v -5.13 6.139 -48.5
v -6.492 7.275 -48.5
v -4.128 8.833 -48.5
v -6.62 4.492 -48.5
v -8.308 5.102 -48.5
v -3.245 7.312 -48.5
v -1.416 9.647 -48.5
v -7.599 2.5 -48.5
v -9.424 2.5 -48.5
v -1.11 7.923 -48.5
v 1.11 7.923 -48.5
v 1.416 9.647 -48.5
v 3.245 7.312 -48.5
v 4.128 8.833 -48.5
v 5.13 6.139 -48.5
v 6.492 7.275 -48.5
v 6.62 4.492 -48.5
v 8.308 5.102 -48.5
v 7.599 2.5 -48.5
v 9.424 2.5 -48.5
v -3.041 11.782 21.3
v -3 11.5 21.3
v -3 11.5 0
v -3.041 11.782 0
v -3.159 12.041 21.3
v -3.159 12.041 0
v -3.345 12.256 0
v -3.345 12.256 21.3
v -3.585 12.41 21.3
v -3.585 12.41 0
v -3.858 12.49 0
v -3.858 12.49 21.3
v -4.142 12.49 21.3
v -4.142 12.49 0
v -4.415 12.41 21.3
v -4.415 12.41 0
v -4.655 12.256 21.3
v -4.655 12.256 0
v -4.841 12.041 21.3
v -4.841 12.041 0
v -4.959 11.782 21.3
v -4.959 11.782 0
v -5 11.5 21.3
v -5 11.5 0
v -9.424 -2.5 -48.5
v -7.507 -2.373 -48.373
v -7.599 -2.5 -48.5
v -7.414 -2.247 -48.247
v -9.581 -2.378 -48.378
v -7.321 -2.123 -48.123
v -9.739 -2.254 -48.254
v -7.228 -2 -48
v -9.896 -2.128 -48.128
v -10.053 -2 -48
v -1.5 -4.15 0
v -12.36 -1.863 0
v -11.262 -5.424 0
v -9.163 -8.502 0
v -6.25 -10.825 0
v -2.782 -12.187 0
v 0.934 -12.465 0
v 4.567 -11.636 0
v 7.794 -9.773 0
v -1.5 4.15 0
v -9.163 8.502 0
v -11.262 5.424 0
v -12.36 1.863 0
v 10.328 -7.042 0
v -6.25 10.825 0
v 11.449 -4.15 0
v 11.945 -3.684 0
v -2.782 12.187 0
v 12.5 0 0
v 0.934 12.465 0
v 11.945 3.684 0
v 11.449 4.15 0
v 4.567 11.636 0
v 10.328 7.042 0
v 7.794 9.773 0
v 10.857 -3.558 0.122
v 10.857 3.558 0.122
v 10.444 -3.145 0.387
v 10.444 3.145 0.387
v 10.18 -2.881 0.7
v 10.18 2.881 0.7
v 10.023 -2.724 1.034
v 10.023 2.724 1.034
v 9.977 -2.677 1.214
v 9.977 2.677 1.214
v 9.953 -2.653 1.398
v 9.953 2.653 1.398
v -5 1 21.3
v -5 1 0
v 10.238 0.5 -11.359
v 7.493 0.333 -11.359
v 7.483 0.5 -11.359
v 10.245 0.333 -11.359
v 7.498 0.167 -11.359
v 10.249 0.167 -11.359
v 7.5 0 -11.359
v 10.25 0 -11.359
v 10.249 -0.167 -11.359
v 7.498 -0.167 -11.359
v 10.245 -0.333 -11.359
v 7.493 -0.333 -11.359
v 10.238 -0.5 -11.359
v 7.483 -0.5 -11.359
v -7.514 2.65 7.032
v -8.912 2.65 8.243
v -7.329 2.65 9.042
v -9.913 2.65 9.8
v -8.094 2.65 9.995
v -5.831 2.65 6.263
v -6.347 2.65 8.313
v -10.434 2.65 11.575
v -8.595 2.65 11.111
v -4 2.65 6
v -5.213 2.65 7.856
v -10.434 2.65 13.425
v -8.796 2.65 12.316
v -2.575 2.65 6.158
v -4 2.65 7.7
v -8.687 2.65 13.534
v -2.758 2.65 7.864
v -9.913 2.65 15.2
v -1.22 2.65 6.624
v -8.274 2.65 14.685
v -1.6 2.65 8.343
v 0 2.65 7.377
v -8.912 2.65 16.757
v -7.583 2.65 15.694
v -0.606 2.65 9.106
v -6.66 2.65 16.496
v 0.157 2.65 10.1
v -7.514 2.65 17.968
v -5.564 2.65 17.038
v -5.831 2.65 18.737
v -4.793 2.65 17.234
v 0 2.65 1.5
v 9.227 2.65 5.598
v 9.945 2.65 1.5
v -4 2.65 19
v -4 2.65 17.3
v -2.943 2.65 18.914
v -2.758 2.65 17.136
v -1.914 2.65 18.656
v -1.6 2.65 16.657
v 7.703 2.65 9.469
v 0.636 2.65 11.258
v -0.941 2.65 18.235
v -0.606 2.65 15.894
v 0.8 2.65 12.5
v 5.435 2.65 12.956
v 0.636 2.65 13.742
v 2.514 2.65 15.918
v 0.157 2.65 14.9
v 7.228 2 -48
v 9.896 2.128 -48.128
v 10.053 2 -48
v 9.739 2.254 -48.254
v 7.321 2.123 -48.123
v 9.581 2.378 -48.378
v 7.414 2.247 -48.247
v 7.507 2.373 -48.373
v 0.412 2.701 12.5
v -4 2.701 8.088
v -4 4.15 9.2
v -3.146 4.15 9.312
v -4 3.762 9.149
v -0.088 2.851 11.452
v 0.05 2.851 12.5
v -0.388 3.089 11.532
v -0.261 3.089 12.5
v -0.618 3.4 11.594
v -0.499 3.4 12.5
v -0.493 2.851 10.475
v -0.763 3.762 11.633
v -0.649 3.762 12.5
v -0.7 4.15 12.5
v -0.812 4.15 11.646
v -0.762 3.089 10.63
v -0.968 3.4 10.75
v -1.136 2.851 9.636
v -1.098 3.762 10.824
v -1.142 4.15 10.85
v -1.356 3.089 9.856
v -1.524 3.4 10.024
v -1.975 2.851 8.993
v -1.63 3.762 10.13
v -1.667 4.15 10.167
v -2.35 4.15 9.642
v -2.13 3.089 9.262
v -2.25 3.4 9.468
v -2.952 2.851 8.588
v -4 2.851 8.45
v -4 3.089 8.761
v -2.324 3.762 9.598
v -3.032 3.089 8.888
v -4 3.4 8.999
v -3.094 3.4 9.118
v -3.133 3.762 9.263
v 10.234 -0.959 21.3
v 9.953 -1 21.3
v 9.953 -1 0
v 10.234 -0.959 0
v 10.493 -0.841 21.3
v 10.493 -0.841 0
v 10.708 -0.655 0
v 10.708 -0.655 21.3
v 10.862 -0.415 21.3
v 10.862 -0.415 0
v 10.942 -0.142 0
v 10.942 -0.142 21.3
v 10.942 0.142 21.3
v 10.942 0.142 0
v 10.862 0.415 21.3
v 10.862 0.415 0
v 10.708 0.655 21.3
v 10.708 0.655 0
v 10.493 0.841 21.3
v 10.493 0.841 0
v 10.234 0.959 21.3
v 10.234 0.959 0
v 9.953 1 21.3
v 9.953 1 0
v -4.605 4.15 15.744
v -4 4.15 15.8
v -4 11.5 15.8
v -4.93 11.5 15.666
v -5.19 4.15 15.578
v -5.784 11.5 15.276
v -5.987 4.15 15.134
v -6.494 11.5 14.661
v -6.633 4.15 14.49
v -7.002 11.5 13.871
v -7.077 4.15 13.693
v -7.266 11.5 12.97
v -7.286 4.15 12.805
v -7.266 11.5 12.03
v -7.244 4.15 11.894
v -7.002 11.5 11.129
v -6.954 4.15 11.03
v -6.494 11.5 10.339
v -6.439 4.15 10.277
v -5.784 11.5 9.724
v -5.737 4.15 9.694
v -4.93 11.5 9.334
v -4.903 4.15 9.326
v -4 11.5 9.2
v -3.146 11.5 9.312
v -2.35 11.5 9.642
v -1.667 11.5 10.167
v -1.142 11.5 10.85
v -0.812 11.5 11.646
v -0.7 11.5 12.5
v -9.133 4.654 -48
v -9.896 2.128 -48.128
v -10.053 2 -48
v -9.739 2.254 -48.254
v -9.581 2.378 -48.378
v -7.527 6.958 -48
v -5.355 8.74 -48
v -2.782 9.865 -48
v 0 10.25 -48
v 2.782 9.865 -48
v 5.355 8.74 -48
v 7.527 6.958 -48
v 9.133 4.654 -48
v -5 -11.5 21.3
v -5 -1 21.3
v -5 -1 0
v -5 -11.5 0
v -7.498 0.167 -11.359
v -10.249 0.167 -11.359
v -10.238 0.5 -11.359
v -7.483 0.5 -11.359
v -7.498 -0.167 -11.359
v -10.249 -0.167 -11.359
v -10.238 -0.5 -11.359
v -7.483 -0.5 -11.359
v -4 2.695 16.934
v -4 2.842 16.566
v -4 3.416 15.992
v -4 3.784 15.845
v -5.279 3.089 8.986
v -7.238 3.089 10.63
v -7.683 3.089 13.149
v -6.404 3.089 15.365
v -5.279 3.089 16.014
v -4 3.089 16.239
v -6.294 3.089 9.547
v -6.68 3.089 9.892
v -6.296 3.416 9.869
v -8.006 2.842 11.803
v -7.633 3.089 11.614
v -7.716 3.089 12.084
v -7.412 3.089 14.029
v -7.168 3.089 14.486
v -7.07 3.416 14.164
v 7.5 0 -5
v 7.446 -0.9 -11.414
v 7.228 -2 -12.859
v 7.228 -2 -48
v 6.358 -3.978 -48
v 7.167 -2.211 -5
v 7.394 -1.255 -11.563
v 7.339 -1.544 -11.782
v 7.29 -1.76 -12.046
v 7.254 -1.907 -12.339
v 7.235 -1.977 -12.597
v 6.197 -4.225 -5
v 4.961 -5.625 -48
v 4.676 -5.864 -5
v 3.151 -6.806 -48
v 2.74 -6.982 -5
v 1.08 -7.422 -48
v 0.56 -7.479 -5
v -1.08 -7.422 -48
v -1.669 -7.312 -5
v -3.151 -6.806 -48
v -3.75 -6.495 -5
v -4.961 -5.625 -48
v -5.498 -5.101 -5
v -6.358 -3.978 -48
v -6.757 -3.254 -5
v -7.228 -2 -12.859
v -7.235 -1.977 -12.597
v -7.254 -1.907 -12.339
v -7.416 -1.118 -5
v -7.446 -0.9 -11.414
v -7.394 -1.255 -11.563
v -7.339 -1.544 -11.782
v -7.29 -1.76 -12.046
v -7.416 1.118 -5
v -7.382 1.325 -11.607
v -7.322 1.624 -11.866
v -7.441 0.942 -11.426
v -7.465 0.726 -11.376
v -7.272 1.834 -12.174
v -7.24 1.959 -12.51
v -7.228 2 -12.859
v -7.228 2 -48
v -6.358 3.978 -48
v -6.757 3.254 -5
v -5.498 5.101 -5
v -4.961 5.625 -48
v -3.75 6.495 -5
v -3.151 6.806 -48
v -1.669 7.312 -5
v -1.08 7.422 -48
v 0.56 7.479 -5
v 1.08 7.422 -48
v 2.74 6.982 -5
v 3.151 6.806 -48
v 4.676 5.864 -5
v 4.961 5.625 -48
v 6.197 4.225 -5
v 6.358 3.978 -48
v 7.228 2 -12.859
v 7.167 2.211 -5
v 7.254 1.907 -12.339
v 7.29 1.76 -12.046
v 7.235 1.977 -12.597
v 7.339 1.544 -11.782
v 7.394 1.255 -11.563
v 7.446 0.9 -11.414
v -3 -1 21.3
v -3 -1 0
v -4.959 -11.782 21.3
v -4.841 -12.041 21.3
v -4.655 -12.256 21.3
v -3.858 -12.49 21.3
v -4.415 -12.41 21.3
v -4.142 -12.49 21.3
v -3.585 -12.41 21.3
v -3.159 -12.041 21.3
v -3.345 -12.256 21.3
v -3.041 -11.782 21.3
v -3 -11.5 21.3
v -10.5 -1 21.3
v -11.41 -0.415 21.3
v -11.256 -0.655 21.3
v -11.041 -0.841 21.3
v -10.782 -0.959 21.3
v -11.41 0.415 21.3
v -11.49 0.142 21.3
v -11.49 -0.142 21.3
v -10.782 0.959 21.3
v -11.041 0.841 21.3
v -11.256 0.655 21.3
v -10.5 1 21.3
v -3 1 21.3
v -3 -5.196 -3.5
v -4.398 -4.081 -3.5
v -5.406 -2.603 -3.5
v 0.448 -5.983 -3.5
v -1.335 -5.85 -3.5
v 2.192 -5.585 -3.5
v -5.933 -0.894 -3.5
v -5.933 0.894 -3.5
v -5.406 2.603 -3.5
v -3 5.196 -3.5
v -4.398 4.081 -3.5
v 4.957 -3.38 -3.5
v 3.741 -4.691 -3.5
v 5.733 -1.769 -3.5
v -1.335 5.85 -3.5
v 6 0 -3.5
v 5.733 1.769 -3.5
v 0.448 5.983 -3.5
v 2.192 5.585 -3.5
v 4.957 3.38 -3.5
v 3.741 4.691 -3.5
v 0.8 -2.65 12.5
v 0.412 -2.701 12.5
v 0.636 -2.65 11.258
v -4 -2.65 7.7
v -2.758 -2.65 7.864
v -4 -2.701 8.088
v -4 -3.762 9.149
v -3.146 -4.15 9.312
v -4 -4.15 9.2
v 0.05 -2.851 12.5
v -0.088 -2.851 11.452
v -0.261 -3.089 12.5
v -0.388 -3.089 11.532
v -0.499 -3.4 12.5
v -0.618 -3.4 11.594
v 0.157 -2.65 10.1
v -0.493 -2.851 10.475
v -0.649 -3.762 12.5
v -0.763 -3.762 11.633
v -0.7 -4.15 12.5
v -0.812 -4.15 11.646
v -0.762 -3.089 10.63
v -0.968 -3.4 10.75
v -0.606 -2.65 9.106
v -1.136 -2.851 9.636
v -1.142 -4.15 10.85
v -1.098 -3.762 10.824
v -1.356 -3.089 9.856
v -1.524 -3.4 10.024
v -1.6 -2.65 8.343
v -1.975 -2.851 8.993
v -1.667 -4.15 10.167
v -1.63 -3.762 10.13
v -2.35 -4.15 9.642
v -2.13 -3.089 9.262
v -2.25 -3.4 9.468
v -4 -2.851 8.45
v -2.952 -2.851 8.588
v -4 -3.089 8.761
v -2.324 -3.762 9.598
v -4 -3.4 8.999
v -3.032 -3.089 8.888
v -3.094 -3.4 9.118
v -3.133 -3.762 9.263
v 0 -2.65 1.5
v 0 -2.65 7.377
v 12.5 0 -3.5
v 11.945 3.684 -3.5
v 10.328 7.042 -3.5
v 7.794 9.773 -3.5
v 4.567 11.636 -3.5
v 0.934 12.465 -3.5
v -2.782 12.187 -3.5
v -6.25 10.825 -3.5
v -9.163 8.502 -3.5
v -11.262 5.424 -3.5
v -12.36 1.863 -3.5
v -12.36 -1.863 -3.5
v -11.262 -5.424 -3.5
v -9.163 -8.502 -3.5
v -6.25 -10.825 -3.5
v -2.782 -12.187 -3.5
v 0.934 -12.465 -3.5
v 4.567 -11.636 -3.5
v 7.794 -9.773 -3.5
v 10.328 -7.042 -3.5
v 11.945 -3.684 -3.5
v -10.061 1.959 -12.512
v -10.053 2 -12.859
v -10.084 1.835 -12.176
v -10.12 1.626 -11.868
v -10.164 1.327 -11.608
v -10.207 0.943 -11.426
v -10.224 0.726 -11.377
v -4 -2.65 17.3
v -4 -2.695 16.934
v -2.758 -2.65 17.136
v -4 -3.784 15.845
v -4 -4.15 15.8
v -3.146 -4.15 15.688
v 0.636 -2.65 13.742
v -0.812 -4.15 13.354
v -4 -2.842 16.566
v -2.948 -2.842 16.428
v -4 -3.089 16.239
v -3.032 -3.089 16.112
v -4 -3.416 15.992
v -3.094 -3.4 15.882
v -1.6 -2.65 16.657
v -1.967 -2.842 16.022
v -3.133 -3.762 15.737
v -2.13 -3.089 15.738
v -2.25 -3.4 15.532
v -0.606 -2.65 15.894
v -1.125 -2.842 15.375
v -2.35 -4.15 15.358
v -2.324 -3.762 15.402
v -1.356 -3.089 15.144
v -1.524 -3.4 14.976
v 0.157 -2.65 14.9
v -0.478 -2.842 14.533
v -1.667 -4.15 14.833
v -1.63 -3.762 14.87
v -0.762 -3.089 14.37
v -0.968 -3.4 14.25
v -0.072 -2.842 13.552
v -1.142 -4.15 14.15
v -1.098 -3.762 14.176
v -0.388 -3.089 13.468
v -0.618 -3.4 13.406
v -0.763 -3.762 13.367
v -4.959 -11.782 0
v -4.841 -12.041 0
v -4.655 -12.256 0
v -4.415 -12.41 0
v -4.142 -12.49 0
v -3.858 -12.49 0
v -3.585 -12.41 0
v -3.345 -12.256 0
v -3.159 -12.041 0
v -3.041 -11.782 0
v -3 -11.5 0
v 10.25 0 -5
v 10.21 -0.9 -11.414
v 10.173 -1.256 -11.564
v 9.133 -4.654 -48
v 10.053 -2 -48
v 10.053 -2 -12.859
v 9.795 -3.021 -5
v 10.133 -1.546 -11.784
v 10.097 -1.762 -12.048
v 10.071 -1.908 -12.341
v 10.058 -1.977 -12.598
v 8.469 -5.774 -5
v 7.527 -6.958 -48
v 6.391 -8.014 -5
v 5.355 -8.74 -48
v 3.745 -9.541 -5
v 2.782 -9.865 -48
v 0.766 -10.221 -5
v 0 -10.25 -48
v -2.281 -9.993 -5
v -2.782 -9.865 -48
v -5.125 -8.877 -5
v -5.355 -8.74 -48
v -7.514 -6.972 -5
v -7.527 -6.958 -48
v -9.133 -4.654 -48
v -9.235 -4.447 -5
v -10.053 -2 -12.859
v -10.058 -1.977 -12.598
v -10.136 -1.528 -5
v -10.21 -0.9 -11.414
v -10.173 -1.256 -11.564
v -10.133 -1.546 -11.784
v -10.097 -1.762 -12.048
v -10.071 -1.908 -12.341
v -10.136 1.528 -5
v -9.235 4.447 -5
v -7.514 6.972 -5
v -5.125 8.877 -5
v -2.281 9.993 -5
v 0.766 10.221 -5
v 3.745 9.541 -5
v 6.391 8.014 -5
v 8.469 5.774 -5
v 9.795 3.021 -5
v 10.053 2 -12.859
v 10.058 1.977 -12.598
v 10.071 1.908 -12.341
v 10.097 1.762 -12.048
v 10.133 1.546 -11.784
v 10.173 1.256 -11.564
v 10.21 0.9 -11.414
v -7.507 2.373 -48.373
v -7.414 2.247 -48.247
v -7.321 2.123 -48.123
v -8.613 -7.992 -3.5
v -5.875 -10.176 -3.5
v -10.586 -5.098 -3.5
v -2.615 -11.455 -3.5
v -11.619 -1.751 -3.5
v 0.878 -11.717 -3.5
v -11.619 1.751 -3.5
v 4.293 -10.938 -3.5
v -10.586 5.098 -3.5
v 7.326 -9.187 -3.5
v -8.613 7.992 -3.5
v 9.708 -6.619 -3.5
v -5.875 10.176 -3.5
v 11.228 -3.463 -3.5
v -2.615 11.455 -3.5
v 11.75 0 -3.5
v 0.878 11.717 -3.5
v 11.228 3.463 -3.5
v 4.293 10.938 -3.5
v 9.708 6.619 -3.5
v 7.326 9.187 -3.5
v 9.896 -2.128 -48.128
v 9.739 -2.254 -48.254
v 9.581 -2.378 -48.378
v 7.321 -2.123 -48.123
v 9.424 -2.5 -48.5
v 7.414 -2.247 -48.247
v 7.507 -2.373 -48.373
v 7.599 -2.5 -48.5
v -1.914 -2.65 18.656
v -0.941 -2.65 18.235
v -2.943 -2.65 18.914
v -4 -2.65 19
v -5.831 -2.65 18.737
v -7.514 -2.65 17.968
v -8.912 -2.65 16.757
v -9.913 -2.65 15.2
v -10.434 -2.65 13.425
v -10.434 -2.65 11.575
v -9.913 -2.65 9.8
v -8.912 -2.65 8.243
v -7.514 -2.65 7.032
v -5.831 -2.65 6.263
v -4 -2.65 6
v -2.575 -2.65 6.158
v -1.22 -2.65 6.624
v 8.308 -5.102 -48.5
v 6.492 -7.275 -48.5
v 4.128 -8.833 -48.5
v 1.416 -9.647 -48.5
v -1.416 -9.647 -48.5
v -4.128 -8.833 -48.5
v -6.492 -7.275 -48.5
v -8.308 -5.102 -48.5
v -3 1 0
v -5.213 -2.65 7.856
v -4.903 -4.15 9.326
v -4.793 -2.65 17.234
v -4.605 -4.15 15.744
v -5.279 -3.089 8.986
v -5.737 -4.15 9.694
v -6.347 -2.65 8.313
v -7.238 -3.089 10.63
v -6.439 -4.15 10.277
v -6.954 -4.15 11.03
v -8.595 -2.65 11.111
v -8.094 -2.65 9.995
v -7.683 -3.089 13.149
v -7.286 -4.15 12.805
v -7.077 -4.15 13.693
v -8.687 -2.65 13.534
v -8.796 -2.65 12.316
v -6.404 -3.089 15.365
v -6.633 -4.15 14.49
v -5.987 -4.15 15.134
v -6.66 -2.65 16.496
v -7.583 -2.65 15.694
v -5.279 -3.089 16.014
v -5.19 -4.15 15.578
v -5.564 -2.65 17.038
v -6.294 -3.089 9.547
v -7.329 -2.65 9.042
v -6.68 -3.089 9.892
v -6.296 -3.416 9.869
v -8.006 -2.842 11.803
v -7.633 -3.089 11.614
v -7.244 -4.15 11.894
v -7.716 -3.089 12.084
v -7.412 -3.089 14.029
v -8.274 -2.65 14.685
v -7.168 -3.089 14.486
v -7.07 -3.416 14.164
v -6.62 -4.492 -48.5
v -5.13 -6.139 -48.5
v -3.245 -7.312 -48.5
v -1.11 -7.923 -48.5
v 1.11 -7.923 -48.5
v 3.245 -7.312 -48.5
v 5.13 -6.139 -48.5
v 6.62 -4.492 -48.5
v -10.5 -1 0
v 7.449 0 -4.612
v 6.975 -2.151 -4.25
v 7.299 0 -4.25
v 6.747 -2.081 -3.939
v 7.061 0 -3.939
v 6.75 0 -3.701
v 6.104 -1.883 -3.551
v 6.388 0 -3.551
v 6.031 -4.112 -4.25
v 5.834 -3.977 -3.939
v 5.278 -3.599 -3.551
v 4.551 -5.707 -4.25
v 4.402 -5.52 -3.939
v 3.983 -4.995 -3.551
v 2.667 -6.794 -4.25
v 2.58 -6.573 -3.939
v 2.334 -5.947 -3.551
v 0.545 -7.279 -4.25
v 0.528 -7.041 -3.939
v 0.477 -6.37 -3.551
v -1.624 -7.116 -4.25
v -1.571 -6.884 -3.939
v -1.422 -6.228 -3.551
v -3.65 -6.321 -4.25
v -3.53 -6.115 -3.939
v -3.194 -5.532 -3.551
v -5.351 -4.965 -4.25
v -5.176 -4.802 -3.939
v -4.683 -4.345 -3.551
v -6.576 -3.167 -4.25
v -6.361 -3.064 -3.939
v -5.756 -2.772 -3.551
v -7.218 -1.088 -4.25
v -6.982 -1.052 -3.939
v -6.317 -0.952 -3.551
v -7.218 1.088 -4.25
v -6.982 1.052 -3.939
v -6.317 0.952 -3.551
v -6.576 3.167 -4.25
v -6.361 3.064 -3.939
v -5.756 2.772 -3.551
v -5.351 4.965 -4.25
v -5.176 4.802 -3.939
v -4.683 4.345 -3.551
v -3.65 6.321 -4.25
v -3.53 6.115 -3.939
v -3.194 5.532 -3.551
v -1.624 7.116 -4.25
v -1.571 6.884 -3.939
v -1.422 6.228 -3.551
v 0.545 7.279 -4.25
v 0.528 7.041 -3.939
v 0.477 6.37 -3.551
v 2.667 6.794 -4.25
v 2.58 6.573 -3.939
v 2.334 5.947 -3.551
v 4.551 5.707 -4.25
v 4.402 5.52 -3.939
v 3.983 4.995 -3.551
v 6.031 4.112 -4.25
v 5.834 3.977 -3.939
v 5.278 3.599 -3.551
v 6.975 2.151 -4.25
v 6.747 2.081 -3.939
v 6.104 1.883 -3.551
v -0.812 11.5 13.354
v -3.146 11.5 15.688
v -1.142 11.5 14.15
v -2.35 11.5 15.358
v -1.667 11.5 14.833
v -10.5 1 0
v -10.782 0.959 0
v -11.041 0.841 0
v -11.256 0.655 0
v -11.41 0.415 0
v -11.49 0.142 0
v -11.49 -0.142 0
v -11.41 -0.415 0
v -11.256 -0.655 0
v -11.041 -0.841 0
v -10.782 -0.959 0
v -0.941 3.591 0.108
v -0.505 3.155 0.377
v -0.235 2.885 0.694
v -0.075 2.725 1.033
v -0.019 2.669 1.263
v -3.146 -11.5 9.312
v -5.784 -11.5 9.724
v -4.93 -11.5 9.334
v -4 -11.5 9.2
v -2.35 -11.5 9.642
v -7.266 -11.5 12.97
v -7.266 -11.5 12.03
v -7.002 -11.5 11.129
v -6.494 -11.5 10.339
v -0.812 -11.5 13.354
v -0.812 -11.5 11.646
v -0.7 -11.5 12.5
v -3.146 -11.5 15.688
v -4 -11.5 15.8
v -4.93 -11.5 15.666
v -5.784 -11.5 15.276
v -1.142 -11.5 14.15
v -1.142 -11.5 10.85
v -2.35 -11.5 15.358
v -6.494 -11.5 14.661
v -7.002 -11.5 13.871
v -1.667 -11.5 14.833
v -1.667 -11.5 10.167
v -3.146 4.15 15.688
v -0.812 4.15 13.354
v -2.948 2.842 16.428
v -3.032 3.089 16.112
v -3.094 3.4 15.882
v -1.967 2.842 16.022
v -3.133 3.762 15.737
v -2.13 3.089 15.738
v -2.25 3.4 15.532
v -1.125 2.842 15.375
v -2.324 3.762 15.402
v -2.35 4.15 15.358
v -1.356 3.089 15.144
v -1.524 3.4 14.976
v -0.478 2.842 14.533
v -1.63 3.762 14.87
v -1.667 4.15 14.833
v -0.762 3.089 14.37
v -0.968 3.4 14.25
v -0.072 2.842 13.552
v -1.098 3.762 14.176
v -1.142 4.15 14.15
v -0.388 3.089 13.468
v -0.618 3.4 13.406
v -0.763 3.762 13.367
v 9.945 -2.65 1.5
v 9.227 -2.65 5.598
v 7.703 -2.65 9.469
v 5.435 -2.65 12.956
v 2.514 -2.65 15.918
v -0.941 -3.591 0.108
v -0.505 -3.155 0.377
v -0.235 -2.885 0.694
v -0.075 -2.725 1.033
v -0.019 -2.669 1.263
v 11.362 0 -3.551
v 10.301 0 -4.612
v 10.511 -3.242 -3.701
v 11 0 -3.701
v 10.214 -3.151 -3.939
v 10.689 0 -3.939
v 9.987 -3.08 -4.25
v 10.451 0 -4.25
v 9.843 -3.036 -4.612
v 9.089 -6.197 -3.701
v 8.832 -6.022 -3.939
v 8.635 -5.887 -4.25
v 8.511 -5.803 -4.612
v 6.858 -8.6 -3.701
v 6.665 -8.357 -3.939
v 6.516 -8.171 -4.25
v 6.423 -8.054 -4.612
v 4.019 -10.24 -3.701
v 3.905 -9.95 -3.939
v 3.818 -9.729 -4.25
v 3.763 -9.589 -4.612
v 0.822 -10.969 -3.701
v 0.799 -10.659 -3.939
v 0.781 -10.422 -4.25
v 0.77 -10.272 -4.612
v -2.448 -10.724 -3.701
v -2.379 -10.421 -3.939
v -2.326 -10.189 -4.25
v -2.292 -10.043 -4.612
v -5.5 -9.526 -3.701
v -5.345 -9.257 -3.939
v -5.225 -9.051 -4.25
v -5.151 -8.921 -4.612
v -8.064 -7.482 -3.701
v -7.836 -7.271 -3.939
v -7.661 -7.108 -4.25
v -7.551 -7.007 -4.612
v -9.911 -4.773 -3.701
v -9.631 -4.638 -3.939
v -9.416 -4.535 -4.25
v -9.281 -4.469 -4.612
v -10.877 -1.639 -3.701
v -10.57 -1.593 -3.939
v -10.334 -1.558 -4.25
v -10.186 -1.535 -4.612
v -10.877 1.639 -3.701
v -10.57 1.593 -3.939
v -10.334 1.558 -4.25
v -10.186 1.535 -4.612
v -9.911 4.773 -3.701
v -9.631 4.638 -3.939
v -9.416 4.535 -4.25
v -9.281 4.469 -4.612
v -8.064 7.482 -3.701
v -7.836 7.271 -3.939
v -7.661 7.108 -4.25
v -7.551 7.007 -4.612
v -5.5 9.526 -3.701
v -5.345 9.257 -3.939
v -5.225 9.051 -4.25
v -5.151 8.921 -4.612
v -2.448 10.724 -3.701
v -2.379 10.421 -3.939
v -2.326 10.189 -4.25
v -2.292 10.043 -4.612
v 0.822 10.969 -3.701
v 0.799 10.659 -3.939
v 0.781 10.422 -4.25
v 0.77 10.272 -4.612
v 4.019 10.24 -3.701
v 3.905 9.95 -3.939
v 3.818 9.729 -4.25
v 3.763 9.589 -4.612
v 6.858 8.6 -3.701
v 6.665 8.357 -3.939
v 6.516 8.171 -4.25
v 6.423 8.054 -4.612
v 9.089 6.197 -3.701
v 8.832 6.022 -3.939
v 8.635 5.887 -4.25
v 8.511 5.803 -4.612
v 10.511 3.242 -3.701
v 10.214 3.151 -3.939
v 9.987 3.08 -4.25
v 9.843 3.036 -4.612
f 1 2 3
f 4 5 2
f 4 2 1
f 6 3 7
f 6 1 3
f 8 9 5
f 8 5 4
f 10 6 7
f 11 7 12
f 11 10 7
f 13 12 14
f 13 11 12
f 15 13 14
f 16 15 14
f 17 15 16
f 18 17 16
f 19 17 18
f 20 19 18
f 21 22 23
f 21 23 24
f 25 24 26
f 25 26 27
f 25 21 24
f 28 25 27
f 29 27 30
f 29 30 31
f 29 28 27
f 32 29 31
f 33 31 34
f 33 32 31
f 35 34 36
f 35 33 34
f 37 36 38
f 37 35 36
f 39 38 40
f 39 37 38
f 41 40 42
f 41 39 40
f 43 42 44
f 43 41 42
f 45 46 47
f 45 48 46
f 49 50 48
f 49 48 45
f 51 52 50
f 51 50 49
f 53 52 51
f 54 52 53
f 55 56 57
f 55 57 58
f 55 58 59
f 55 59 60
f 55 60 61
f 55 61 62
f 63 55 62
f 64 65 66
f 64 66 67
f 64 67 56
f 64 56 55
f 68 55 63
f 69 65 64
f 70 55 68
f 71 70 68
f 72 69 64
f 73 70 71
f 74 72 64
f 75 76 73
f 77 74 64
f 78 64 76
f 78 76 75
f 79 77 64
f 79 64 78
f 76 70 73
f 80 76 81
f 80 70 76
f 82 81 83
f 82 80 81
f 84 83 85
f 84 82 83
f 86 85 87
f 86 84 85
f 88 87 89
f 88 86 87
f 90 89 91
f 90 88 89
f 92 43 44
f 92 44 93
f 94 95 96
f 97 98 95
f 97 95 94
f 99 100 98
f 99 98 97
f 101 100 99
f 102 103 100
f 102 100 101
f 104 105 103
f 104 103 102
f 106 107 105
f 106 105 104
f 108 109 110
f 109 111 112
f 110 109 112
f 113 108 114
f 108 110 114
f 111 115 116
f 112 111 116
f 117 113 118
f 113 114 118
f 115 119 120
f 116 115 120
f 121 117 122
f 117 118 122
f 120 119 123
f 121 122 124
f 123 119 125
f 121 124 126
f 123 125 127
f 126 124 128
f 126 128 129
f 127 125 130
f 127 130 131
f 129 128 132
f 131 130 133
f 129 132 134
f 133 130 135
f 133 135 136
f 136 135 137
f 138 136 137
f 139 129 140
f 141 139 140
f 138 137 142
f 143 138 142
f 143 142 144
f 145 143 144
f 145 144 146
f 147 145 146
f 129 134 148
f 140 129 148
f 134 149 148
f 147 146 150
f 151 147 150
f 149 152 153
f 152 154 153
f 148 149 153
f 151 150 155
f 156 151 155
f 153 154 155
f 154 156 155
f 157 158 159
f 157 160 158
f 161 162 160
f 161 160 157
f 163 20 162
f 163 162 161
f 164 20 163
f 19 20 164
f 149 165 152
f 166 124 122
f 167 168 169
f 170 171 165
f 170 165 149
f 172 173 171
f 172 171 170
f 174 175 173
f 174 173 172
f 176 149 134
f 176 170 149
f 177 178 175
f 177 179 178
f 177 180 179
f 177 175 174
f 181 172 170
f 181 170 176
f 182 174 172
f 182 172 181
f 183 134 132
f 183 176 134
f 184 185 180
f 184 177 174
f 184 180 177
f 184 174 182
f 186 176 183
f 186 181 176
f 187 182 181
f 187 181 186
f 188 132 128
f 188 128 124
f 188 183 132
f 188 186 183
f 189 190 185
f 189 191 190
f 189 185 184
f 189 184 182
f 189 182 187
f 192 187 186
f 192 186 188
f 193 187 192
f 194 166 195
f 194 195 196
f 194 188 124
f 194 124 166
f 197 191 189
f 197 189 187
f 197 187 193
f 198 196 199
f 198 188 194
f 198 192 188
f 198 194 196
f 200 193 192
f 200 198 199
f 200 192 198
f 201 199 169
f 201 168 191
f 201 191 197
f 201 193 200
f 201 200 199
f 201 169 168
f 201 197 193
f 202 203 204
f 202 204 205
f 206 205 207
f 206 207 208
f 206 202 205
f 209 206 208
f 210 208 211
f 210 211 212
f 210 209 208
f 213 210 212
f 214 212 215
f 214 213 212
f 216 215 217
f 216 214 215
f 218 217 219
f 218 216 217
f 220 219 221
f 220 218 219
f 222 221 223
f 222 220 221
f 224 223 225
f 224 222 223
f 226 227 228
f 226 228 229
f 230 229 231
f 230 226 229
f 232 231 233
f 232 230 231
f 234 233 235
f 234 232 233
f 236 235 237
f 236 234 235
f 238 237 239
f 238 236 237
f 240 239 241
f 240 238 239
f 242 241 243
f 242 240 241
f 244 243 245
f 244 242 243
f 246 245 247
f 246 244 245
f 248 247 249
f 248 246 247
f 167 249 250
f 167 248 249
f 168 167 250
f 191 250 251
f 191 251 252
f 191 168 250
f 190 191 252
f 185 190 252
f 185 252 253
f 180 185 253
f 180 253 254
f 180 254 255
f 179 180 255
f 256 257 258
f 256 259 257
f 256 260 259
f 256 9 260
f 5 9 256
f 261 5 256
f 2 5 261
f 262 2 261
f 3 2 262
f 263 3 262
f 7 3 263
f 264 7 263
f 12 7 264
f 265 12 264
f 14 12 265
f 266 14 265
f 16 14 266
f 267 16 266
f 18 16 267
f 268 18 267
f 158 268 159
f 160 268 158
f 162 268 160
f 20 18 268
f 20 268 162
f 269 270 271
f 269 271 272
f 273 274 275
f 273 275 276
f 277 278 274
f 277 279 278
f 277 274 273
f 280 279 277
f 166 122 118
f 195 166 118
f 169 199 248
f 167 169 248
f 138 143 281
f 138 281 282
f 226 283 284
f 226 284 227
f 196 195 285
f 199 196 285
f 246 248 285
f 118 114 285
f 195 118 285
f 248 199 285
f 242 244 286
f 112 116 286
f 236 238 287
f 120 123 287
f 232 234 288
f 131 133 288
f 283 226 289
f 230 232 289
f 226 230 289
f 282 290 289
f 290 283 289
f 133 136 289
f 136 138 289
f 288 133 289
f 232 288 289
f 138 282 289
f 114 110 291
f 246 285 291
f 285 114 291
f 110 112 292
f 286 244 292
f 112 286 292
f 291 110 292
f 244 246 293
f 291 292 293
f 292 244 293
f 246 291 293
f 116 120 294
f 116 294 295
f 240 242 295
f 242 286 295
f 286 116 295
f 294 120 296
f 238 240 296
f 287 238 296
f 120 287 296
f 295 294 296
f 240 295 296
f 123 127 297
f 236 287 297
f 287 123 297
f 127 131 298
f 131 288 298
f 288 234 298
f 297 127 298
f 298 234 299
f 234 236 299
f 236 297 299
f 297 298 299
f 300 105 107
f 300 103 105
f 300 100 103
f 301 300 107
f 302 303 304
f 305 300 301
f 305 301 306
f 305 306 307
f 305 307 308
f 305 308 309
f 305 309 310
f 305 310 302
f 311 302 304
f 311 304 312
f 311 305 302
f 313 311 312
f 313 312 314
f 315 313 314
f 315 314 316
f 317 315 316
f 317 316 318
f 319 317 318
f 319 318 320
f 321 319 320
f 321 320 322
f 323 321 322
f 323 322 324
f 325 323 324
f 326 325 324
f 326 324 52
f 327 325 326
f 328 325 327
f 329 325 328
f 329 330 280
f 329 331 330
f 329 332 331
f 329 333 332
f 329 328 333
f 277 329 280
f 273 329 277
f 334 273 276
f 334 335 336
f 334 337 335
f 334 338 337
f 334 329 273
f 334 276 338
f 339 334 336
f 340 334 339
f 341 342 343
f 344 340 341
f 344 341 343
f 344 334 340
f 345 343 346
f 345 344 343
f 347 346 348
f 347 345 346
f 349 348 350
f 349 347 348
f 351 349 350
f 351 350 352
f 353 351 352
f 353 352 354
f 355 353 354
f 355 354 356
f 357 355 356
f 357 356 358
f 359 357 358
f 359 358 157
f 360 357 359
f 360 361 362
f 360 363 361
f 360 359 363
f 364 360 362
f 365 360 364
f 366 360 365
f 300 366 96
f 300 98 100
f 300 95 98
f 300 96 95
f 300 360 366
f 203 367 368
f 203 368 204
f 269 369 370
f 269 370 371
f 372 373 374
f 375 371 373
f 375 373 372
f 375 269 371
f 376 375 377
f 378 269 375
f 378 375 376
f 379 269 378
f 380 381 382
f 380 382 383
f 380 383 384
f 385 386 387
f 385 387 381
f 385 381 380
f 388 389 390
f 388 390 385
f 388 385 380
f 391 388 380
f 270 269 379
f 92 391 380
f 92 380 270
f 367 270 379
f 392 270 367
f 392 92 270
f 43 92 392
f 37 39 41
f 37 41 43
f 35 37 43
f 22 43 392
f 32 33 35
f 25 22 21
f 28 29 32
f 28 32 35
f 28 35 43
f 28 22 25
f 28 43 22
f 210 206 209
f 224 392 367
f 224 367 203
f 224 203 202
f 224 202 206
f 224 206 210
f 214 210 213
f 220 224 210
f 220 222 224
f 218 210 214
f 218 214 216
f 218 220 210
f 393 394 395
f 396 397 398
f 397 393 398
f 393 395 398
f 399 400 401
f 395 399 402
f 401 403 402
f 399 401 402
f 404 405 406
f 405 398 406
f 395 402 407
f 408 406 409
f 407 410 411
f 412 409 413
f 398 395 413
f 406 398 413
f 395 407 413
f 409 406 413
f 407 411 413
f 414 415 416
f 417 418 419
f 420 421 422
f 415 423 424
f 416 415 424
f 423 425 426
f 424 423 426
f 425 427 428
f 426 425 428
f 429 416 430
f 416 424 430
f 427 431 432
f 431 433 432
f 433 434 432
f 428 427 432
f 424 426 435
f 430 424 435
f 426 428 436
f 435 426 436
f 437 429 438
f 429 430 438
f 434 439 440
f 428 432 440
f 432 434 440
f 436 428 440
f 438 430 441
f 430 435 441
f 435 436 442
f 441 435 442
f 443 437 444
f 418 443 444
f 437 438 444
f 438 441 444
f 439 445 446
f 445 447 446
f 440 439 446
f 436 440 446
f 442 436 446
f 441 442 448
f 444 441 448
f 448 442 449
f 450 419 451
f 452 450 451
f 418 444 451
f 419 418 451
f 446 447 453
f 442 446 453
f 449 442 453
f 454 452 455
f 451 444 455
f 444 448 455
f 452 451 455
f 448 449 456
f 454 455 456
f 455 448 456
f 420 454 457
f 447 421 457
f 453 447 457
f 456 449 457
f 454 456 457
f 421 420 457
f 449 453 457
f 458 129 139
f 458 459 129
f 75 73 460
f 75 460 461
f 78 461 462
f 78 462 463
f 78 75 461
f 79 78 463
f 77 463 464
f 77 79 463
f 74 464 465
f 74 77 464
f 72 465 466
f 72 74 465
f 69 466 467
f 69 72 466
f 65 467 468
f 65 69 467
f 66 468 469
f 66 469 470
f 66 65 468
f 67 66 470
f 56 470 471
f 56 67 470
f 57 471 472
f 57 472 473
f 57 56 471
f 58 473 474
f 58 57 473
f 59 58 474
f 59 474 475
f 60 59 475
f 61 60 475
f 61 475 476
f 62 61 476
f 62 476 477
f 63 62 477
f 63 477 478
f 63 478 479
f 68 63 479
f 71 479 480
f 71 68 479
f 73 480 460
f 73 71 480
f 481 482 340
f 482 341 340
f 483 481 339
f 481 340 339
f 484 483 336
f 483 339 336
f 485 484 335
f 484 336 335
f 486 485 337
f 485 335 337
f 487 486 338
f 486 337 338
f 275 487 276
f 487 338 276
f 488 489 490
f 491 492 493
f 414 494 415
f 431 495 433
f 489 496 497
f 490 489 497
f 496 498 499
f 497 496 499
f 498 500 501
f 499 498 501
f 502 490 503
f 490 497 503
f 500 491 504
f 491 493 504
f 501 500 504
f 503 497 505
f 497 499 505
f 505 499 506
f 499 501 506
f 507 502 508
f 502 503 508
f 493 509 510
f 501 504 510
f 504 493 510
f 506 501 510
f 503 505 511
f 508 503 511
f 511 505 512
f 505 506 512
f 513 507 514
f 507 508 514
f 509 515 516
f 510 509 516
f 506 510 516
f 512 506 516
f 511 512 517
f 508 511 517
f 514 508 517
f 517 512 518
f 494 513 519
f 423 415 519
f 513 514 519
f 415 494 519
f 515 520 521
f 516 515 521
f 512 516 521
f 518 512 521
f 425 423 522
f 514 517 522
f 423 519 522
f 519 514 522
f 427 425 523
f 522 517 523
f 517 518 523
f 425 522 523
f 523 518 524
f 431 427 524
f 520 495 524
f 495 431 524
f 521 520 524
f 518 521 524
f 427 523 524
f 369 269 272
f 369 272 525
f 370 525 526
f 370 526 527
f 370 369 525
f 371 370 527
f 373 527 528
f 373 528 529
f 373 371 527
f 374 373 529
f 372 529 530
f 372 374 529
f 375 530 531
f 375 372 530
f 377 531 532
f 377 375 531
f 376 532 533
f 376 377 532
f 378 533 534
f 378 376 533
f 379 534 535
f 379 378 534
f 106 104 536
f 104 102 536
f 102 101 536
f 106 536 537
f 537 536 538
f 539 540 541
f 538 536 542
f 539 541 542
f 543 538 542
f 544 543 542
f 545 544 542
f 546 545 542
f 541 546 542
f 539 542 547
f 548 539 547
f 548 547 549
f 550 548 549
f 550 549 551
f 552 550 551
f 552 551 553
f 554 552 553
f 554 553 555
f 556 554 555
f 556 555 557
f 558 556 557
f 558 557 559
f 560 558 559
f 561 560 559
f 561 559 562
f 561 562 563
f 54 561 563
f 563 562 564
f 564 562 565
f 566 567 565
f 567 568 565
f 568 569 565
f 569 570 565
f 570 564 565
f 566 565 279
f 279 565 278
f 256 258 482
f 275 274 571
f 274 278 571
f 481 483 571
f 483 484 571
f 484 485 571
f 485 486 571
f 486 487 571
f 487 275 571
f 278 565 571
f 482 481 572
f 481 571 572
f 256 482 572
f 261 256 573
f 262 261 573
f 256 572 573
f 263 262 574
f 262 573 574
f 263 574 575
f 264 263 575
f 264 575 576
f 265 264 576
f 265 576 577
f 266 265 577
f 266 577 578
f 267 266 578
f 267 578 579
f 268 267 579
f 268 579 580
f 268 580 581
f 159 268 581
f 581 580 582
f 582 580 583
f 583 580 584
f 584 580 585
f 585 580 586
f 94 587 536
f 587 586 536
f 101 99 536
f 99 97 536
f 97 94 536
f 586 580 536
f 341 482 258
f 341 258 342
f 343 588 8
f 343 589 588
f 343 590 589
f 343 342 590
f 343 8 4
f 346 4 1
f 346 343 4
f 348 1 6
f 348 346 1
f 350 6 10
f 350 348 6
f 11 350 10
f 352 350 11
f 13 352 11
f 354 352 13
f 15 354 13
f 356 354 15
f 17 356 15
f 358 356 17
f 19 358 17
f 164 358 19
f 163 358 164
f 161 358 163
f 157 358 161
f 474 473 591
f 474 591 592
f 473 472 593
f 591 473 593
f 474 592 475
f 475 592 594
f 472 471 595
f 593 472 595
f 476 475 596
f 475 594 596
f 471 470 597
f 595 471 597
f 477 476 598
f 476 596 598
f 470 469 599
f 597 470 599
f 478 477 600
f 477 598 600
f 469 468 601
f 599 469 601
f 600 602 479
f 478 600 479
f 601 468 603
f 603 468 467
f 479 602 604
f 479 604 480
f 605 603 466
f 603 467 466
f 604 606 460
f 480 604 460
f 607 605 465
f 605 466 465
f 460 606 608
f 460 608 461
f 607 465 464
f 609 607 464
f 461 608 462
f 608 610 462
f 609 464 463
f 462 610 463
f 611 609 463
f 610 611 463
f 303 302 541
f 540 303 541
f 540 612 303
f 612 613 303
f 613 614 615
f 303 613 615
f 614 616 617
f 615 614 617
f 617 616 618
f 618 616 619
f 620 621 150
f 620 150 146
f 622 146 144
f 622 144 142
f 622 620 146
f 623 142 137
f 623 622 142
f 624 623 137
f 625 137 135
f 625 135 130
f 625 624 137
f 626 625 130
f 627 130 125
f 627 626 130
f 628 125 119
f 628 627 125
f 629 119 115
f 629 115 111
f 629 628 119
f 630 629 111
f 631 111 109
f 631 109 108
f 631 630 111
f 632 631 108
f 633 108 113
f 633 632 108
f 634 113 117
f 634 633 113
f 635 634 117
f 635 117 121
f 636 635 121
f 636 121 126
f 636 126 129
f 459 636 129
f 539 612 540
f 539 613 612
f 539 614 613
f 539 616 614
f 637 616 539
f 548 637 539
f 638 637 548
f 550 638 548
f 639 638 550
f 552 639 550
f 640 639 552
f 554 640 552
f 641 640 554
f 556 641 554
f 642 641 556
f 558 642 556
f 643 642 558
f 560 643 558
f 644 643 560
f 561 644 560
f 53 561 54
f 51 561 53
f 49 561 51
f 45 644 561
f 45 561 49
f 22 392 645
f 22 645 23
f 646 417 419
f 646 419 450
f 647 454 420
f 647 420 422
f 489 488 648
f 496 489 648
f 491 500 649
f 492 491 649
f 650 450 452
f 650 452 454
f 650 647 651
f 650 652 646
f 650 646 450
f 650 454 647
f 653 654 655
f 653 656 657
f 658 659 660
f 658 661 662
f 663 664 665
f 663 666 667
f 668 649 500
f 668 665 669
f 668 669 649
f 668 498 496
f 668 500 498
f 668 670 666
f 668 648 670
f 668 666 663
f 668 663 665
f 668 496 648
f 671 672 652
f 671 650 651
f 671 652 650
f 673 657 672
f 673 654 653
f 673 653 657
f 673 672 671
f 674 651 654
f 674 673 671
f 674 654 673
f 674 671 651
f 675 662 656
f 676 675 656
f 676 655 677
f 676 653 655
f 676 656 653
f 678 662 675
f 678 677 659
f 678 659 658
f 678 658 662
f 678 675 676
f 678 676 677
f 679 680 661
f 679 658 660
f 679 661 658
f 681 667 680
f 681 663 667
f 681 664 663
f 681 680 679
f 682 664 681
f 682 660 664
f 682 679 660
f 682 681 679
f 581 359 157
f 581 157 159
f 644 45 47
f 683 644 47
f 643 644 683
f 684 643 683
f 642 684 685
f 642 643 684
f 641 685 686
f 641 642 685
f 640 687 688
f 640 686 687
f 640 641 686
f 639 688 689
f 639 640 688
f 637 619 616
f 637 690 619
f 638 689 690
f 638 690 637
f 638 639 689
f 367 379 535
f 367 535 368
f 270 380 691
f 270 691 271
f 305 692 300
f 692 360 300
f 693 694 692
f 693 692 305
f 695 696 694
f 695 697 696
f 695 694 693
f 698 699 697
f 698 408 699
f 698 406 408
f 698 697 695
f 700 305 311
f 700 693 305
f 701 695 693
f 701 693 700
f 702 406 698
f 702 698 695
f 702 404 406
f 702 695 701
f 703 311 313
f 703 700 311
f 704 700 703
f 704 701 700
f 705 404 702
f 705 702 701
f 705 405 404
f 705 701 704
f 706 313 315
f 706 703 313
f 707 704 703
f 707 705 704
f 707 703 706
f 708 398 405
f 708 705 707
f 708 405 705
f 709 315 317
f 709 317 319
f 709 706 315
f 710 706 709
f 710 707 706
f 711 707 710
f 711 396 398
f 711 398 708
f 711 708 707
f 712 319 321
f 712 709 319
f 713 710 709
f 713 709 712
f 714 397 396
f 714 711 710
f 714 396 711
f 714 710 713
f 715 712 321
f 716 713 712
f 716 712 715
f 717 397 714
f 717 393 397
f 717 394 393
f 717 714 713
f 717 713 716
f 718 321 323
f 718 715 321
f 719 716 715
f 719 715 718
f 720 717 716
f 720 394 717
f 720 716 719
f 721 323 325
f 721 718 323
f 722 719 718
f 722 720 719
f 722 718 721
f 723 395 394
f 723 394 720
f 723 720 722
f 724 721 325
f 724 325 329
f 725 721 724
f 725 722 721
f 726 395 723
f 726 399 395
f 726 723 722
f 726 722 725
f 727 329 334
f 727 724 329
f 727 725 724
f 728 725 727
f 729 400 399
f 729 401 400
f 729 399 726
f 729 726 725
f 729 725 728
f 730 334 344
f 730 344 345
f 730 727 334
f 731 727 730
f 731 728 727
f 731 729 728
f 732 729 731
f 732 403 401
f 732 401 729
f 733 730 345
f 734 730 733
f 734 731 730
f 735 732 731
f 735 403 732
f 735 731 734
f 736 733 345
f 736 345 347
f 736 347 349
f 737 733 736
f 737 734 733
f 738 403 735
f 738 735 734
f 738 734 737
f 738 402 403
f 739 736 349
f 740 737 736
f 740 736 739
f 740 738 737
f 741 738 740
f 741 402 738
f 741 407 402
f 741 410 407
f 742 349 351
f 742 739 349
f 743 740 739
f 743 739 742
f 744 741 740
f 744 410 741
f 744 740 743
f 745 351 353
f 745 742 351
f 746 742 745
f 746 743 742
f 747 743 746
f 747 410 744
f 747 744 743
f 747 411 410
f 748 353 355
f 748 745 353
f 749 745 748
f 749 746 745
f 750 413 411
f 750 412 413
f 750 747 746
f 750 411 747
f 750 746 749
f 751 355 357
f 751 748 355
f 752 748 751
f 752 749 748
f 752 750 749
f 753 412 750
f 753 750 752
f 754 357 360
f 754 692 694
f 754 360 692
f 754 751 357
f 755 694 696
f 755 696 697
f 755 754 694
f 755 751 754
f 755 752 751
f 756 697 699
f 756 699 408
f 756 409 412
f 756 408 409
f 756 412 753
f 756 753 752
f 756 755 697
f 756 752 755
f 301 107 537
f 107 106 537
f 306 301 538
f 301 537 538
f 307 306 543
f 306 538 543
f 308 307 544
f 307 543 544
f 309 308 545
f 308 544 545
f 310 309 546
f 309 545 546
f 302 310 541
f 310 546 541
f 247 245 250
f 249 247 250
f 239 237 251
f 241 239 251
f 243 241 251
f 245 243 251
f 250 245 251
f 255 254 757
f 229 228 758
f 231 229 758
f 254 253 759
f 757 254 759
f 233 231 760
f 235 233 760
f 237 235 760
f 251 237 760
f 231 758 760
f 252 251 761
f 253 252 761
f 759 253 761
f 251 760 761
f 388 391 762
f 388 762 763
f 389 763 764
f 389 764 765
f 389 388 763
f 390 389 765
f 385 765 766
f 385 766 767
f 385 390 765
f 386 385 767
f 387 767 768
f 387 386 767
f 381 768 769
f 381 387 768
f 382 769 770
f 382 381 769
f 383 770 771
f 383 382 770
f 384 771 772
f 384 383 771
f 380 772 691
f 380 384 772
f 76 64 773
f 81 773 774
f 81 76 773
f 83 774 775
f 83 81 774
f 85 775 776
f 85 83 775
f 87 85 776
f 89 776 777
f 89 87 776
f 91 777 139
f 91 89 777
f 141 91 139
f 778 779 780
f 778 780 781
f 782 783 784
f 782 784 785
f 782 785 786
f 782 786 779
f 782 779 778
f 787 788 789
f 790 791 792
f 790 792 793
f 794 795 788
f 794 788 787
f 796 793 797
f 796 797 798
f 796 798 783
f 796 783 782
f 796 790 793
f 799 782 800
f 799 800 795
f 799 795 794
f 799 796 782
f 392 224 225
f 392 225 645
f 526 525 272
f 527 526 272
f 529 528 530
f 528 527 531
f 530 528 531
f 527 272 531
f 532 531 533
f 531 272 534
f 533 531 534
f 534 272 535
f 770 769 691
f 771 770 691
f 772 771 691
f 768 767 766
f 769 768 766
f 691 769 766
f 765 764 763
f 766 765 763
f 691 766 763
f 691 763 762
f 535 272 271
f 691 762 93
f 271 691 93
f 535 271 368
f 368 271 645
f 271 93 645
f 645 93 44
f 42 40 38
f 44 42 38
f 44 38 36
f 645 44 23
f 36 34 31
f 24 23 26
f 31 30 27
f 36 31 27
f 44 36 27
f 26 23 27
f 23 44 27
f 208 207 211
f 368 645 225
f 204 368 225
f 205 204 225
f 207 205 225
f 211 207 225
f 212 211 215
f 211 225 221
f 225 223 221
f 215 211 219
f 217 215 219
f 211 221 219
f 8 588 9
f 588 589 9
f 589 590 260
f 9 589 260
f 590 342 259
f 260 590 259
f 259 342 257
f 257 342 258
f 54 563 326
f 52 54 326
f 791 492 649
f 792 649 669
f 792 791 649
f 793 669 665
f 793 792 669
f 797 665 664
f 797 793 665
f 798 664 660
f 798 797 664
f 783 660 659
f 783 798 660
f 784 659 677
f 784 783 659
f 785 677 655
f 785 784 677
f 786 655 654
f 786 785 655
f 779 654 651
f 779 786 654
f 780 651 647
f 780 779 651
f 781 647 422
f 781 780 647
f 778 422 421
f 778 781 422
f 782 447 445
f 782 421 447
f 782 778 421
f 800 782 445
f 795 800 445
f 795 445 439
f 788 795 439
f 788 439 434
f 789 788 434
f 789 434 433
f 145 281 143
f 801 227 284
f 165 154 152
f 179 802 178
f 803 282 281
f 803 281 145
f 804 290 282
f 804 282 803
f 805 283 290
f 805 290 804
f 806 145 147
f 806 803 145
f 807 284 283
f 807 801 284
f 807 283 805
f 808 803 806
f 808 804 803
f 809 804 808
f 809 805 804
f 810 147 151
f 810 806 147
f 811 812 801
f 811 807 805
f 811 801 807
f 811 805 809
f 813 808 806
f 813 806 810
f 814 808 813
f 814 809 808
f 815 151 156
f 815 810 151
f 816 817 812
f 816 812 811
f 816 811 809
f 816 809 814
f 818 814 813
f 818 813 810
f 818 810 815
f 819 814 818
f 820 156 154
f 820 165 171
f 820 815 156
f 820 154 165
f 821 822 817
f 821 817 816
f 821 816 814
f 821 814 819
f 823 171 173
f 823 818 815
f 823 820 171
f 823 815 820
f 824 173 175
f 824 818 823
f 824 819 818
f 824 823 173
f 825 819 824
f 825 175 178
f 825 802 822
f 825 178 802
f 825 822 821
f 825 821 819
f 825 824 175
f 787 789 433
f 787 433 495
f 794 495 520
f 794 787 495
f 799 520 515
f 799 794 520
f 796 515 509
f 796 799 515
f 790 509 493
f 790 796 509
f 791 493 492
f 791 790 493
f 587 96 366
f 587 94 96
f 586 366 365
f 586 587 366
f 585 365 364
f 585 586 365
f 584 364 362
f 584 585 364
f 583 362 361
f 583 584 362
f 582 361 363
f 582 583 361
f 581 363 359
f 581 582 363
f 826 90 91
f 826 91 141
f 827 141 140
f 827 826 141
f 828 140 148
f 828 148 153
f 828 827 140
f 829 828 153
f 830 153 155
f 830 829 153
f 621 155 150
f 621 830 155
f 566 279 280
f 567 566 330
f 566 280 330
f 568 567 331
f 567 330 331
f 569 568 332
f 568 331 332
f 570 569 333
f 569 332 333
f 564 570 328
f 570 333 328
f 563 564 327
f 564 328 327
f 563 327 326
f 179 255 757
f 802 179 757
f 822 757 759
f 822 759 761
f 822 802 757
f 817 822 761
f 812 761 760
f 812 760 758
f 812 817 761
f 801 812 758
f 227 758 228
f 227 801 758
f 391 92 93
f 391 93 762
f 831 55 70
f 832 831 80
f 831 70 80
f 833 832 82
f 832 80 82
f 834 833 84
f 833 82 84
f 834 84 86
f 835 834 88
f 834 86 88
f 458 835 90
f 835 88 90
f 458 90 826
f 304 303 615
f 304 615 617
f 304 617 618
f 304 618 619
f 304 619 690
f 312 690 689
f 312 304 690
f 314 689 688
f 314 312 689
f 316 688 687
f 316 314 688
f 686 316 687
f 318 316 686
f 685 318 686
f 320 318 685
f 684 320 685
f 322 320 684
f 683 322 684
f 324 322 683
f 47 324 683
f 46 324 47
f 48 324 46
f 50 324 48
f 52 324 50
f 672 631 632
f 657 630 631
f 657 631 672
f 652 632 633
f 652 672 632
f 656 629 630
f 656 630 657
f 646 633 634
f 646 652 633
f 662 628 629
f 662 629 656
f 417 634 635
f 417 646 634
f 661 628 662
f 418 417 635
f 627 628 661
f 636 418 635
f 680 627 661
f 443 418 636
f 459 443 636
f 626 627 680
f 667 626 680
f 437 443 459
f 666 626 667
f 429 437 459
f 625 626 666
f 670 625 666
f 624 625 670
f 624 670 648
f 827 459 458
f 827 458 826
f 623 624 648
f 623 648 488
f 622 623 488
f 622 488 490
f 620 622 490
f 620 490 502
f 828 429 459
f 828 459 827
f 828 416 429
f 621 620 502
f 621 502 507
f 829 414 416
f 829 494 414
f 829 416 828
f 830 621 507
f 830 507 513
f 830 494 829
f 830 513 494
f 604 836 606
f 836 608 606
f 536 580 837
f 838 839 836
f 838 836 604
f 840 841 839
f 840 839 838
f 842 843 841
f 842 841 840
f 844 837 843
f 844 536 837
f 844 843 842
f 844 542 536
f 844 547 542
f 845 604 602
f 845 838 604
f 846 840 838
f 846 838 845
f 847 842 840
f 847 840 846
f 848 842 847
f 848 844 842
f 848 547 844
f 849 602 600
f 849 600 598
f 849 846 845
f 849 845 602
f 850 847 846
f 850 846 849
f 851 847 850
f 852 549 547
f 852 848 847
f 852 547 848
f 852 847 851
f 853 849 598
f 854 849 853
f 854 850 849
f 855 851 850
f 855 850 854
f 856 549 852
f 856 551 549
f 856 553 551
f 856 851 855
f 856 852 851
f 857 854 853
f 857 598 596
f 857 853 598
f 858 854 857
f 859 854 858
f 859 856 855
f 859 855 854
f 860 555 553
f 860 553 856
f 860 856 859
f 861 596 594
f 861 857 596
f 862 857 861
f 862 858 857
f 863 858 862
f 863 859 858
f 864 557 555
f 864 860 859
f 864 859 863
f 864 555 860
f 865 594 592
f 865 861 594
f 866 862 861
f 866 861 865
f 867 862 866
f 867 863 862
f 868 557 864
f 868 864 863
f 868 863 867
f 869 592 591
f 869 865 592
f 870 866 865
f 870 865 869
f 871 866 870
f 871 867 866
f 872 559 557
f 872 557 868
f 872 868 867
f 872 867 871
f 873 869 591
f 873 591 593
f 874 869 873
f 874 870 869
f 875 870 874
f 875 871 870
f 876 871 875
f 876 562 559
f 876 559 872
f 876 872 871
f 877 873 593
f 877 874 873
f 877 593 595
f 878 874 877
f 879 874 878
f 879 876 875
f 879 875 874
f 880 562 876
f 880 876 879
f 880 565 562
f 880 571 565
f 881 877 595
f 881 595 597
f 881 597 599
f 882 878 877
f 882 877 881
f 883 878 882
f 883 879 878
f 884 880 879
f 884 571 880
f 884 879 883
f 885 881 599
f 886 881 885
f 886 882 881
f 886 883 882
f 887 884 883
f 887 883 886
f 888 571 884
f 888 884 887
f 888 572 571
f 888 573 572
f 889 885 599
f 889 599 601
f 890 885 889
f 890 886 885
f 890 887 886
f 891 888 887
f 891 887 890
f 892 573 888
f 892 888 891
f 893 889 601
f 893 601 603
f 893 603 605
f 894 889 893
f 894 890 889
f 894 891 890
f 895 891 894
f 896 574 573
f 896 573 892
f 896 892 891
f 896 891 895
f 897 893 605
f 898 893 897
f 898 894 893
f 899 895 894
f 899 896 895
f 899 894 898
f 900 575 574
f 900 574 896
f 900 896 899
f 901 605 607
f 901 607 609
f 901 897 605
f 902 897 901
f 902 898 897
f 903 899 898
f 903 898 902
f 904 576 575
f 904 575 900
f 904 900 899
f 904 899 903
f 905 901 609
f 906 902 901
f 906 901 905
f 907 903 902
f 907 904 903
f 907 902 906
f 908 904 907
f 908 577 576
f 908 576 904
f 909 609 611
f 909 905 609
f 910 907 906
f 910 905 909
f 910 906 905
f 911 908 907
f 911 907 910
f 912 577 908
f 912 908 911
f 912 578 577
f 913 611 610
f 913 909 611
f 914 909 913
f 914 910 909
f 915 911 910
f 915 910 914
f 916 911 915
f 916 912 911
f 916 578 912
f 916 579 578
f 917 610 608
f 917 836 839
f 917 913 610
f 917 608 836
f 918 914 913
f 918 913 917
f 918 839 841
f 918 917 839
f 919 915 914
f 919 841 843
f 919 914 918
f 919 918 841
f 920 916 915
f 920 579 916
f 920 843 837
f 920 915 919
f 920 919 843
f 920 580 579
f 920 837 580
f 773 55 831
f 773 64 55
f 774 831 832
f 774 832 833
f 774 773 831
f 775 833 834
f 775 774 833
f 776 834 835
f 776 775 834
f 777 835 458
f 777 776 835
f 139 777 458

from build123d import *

# Parameters (mm, degrees)
F1_DEPTH  = 2.65
F2_DEPTH  = 11.5
F3_R      = 12.5
F4_DEPTH  = 3.5
F5_R      = 10.25
F5_R_2    = 7.5
F6_DEPTH  = 45
F7_W      = 52.3298196495
F7_H      = 44.3425662816
F8_DEPTH  = 2
F9_R      = 1.5
F13_SIZE  = 0.5
F11_W     = 1
F11_H     = 1
F12_DEPTH = 21.3


with BuildPart() as f1:
    # F0 (on Front) → F1 (new body, symmetric)
    with BuildSketch(Plane.XZ):
        with BuildLine():
            ThreePointArc((2.5, 12.5), (1.8416607228, 9.6495614373), (0, 7.376524617))
            Line((0, 7.376524617), (0, 0))
            Line((0, 0), (10, 0))
            ThreePointArc((10, 0), (7.0548538101, 10.6329122587), (-0.9411764292, 18.2352940956))
            ThreePointArc((-0.9411764292, 18.2352940956), (1.5737040292, 15.8442223901), (2.5, 12.5))
        make_face()
        with BuildLine():
            ThreePointArc((-4, 15.8), (-1.6665476221, 14.8334523779), (-0.7, 12.5))
            Line((-0.7, 12.5), (0, 12.5))
            Line((0, 12.5), (0, 7.376524617))
            ThreePointArc((0, 7.376524617), (1.8416607228, 9.6495614373), (2.5, 12.5))
            ThreePointArc((2.5, 12.5), (1.5737040292, 15.8442223901), (-0.9411764292, 18.2352940956))
            ThreePointArc((-0.9411764292, 18.2352940956), (-2.4235184145, 18.8059262453), (-4, 19))
            Line((-4, 19), (-4, 15.8))
        make_face()
        with BuildLine():
            Line((0, 12.5), (-0.7, 12.5))
            ThreePointArc((-0.7, 12.5), (-1.6665476221, 10.1665476221), (-4, 9.2))
            Line((-4, 9.2), (-4, 6))
            ThreePointArc((-4, 6), (-1.8848865266, 6.3537576525), (0, 7.376524617))
            Line((0, 7.376524617), (0, 12.5))
        make_face()
        with BuildLine():
            ThreePointArc((-4, 9.2), (-7.3, 12.5), (-4, 15.8))
            Line((-4, 15.8), (-4, 19))
            ThreePointArc((-4, 19), (-10.5, 12.5), (-4, 6))
            Line((-4, 6), (-4, 9.2))
        make_face()
    extrude(amount=F1_DEPTH, both=True)

    # F0 (on Front) → F2 (join, symmetric)
    with BuildSketch(Plane.XZ):
        with BuildLine():
            ThreePointArc((-4, 9.2), (-1.6665476221, 10.1665476221), (-0.7, 12.5))
            Line((-0.7, 12.5), (-4, 12.5))
            Line((-4, 12.5), (-4, 9.2))
        make_face()
        with BuildLine():
            Line((-4, 12.5), (-0.7, 12.5))
            ThreePointArc((-0.7, 12.5), (-1.6665476221, 14.8334523779), (-4, 15.8))
            Line((-4, 15.8), (-4, 12.5))
        make_face()
        with BuildLine():
            Line((-4, 12.5), (-4, 15.8))
            ThreePointArc((-4, 15.8), (-7.3, 12.5), (-4, 9.2))
            Line((-4, 9.2), (-4, 12.5))
        make_face()
    extrude(amount=F2_DEPTH, both=True)

    # F3 (on Top) → F4 (join)
    with BuildSketch(Plane.XY):
        Circle(F3_R)
    extrude(amount=-F4_DEPTH)

    # F5 (on face) → F6 (join)
    with BuildSketch(Plane(origin=(0, 0, -3.5), x_dir=(1, 0, 0), z_dir=(0, 0, -1))):
        Circle(F5_R)
        Circle(F5_R_2, mode=Mode.SUBTRACT)
    extrude(amount=F6_DEPTH)

    # F7 (on Front) → F8 (cut, symmetric)
    with BuildSketch(Plane.XZ):
        with Locations((3.1908433884, -33.530684188)):
            Rectangle(F7_W, F7_H)
    extrude(amount=F8_DEPTH, both=True, mode=Mode.SUBTRACT)

    # F9
    f9_edges = [f1.edges().sort_by_distance(p)[0] for p in [
        (5, -2.65, 0),
        (-4, -2.65, 9.2),
        (-4, 2.65, 9.2),
        (0, 0, 0),
        (-10.25, 0, -3.5),
        (5, 2.65, 0),
        (10, 0, 0),
        (-7.5, 0, -3.5),
        (8.6407, 2, -11.359401),
        (-8.6407, 2, -11.359401),
        (8.6407, -2, -11.359401),
        (-8.6407, -2, -11.359401),
    ]]
    fillet(f9_edges, radius=F9_R)

    # F13
    f13_edges = [f1.edges().sort_by_distance(p)[0] for p in [
        (0, 10.25, -48.5),
        (-8.6407, 2, -48.5),
        (0, 7.5, -48.5),
        (8.6407, 2, -48.5),
        (8.6407, -2, -48.5),
        (0, -7.5, -48.5),
        (-8.6407, -2, -48.5),
        (0, -10.25, -48.5),
    ]]
    chamfer(f13_edges, length=F13_SIZE)


with BuildPart() as f12:
    # F11 (on offset) → F12 (new body, through all)
    with BuildSketch(Plane.XY.offset(21.3)):
        with BuildLine():
            Line((9.9526281655, 1), (-3, 1))
            Line((-3, 1), (-3, 0))
            Line((-3, 0), (-3, -1))
            Line((-3, -1), (9.9526281655, -1))
            ThreePointArc((9.9526281655, -1), (10.9526281655, 0), (9.9526281655, 1))
        make_face()
        with BuildLine():
            Line((-5, 0), (-5, 1))
            Line((-5, 1), (-10.5, 1))
            ThreePointArc((-10.5, 1), (-11.5, 0), (-10.5, -1))
            Line((-10.5, -1), (-5, -1))
            Line((-5, -1), (-5, 0))
        make_face()
        with Locations((-4.5, -0.5)):
            Rectangle(F11_W, F11_H)
        with Locations((-3.5, -0.5)):
            Rectangle(F11_W, F11_H)
        with Locations((-3.5, 0.5)):
            Rectangle(F11_W, F11_H)
        with Locations((-4.5, 0.5)):
            Rectangle(F11_W, F11_H)
        with BuildLine():
            Line((-5, 1), (-4, 1))
            Line((-4, 1), (-3, 1))
            Line((-3, 1), (-3, 11.5))
            ThreePointArc((-3, 11.5), (-4, 12.5), (-5, 11.5))
            Line((-5, 11.5), (-5, 1))
        make_face()
        with BuildLine():
            Line((-3, -1), (-4, -1))
            Line((-4, -1), (-5, -1))
            Line((-5, -1), (-5, -11.5))
            ThreePointArc((-5, -11.5), (-4, -12.5), (-3, -11.5))
            Line((-3, -11.5), (-3, -1))
        make_face()
    extrude(amount=-F12_DEPTH)


solid = Compound([f1.part, f12.part])
